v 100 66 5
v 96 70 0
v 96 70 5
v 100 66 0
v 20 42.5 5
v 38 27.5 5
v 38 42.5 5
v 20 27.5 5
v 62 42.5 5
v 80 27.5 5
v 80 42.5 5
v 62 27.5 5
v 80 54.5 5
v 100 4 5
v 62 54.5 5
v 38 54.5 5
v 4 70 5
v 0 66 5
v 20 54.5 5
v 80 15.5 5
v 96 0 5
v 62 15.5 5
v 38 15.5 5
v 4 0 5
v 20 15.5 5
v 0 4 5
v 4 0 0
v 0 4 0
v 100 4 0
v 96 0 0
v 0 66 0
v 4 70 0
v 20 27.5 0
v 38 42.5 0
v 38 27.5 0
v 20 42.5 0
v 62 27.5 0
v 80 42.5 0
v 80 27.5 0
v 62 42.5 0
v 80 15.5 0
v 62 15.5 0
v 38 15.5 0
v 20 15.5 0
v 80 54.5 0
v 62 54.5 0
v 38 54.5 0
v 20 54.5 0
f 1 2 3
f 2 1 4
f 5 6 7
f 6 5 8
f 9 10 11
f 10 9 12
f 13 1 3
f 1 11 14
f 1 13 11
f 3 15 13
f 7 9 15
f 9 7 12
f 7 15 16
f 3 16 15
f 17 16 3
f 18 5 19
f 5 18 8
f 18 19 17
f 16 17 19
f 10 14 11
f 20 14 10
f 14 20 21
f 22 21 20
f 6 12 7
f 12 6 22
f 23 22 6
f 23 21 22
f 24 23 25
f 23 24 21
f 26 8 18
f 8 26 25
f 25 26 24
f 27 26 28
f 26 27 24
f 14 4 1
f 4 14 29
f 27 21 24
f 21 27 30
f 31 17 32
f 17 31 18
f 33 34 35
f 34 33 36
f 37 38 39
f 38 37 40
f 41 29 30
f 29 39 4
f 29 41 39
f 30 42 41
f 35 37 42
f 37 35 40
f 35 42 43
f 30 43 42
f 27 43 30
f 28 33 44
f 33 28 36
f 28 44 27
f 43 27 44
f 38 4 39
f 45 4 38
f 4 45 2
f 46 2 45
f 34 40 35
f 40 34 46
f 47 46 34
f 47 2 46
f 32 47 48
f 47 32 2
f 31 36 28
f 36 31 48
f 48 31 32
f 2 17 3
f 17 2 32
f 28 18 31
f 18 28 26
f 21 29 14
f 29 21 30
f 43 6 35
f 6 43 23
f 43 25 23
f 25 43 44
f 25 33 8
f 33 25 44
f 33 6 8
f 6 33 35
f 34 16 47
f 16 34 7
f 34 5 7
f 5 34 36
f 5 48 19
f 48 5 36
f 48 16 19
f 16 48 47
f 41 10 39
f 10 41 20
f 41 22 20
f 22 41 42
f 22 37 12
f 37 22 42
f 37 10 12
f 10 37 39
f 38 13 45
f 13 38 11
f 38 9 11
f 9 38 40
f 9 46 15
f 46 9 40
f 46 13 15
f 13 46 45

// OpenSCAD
$fn = 32;

// ----------------------------------------------------------------------
// Windowed plate: 4 voids, 100 x 70 x 5 mm
// ----------------------------------------------------------------------

// --- parameters (mm) ---
plate_l = 100;            // plate length, X
plate_w = 70;             // plate width, Y
plate_t = 5;              // plate thickness, Z
edge_margin = 8;          // wall from the plate edge to any window
win_l = 18;               // pocket length
win_w = 12;               // pocket width
pitch_x = 42;             // grid pitch along X
pitch_y = 27;             // grid pitch along Y
depth_1 = 5;              // depth of void 1 (full thickness = through)
depth_2 = 5;              // depth of void 2 (full thickness = through)
depth_3 = 5;              // depth of void 3 (full thickness = through)
depth_4 = 5;              // depth of void 4 (full thickness = through)
corner_c = 4;             // corner chamfer of the plate

profile = [[4, 0], [96, 0], [100, 4], [100, 66], [96, 70], [4, 70], [0, 66], [0, 4]];  // primary outline, 8 points, counter clockwise
void_1 = [[20, 15.5], [38, 15.5], [38, 27.5], [20, 27.5]];  // pocket at grid node 0,0, 4 points
void_2 = [[20, 42.5], [38, 42.5], [38, 54.5], [20, 54.5]];  // pocket at grid node 0,1, 4 points
void_3 = [[62, 15.5], [80, 15.5], [80, 27.5], [62, 27.5]];  // pocket at grid node 1,0, 4 points
void_4 = [[62, 42.5], [80, 42.5], [80, 54.5], [62, 54.5]];  // pocket at grid node 1,1, 4 points

// --- the one profile operation ---
difference() {
  linear_extrude(height = plate_t) polygon(points = profile);
  translate([0, 0, -1])
    linear_extrude(height = plate_t + 2) polygon(points = void_1);
  translate([0, 0, -1])
    linear_extrude(height = plate_t + 2) polygon(points = void_2);
  translate([0, 0, -1])
    linear_extrude(height = plate_t + 2) polygon(points = void_3);
  translate([0, 0, -1])
    linear_extrude(height = plate_t + 2) polygon(points = void_4);
}
